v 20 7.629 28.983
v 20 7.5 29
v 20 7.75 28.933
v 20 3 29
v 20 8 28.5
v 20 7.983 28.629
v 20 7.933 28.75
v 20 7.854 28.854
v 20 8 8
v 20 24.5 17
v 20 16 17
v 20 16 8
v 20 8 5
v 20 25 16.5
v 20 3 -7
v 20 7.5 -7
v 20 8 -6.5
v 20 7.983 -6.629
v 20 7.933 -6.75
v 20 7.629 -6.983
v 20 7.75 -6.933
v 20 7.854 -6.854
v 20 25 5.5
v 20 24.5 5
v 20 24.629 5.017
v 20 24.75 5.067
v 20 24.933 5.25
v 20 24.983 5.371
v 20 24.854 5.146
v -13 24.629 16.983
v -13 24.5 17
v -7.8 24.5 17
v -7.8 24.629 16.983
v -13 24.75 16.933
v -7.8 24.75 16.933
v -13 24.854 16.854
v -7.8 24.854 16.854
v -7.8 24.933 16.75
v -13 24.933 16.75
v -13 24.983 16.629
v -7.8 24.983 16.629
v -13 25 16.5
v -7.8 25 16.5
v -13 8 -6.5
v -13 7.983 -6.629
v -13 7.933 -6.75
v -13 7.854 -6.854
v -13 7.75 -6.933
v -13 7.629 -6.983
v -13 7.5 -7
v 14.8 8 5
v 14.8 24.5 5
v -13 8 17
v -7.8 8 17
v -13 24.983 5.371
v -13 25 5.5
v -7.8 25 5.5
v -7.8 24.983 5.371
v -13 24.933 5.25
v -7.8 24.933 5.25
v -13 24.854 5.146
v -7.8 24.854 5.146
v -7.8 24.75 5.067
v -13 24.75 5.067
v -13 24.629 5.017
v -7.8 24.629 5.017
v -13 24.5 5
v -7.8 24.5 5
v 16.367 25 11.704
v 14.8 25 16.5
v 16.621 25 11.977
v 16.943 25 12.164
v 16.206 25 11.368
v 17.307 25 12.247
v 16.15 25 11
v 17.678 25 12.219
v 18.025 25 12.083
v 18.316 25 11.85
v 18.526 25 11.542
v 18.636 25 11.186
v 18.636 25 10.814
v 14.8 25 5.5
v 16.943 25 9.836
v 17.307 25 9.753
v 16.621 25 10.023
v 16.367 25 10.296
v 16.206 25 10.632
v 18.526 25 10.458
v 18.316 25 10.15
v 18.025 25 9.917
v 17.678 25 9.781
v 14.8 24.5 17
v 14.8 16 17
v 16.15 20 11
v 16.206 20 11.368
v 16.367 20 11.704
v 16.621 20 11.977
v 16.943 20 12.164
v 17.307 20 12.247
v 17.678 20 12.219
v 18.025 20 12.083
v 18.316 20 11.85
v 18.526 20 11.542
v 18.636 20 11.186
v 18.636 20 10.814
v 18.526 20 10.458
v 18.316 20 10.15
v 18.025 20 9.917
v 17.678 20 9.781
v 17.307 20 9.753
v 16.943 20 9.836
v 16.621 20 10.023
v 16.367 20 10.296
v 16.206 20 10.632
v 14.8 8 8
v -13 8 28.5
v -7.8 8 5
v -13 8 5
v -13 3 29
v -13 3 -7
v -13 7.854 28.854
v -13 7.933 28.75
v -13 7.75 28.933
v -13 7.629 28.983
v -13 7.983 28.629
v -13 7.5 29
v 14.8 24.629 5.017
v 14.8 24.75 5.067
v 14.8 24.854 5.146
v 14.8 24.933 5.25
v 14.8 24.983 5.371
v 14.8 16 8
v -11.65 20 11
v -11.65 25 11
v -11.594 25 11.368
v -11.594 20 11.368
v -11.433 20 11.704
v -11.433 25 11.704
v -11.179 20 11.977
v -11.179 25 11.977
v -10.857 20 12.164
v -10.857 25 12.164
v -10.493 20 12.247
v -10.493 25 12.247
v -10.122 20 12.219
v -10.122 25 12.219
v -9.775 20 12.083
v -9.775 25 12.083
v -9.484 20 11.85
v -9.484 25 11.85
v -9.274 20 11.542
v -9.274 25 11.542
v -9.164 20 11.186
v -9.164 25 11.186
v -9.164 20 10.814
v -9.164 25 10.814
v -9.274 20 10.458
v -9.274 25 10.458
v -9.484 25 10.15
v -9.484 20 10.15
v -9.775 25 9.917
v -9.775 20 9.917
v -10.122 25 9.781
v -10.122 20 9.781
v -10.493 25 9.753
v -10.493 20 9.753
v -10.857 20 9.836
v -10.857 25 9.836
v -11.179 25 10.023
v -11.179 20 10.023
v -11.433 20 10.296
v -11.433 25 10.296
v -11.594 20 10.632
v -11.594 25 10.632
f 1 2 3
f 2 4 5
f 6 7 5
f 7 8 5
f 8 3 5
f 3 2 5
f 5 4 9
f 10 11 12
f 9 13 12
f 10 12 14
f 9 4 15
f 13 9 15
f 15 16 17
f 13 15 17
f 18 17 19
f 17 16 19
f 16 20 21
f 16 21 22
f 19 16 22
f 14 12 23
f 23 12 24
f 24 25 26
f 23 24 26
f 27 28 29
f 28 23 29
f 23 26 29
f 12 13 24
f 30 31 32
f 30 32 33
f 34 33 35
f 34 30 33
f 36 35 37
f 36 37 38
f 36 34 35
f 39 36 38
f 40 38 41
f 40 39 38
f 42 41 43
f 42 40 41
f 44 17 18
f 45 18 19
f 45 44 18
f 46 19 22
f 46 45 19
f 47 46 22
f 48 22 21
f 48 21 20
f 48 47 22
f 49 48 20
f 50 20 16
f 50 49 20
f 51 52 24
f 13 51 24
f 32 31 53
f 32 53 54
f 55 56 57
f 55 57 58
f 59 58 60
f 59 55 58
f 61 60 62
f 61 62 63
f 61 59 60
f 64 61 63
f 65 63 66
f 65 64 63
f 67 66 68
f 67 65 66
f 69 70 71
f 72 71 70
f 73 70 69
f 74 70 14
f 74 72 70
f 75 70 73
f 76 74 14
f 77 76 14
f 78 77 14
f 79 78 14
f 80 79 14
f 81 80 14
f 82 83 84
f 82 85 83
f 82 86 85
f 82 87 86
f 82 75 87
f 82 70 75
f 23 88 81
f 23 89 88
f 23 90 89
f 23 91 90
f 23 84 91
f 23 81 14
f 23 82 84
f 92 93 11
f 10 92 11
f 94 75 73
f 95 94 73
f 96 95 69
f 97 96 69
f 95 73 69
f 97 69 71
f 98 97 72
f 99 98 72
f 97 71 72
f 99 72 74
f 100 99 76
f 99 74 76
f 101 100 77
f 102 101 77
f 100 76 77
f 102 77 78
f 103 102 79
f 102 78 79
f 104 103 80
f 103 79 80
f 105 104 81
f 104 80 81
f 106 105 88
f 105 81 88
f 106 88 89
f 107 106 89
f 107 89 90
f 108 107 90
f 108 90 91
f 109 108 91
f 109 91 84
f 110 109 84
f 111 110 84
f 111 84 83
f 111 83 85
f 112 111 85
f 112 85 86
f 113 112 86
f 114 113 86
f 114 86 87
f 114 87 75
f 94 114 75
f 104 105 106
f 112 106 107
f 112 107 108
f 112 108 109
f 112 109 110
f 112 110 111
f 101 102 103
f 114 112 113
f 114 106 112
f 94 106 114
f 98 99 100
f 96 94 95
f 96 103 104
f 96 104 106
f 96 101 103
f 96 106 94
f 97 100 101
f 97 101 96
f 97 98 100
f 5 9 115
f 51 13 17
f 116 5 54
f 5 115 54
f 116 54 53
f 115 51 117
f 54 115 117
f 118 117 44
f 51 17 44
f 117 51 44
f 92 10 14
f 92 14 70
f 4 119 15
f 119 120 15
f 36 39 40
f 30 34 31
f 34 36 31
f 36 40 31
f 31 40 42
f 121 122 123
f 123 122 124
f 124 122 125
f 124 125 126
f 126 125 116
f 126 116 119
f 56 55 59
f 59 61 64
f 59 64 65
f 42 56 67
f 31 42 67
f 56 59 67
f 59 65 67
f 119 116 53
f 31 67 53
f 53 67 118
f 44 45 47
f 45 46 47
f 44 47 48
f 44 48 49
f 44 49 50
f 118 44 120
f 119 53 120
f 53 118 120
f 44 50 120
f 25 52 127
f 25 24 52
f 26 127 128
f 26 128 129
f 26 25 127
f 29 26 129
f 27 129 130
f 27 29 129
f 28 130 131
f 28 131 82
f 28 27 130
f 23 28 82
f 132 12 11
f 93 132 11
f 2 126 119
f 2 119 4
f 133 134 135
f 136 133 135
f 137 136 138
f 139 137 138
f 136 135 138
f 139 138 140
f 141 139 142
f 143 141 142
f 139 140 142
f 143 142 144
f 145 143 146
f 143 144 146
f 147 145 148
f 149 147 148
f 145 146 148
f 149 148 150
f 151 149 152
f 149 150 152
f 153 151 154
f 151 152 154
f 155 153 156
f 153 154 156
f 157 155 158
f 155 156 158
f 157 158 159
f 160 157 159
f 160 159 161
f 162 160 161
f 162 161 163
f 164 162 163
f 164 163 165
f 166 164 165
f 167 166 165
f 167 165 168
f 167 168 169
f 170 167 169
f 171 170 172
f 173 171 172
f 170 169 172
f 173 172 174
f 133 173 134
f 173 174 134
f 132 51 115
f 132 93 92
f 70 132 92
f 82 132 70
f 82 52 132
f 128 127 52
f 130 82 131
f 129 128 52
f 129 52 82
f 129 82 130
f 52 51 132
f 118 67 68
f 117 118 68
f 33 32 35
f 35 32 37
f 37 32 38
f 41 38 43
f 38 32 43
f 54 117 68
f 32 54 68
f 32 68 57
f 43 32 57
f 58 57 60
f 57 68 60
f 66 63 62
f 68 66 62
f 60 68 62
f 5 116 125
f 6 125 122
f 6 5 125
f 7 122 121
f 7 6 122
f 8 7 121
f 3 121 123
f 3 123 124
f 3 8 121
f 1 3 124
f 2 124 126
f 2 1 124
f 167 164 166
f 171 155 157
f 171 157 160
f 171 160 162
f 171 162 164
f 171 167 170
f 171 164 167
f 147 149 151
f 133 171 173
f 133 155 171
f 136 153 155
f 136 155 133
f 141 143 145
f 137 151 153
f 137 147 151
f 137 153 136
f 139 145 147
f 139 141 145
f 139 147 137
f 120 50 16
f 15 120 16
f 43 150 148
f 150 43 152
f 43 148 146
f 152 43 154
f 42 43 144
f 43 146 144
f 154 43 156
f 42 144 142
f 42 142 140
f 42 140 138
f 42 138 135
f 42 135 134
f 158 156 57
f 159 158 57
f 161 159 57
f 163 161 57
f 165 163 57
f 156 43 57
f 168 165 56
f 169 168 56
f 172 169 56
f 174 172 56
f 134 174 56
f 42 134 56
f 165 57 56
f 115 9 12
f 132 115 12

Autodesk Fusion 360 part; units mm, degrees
sketch "Sketch1" plane through (0, 0, 0) normal (0, 0, 1) x (1, 0, 0)
  line L0 (-13, 8) -> (20, 8)
  line L1 (20, 8) -> (20, 3)
  line L2 (20, 3) -> (-13, 3)
  line L3 (-13, 3) -> (-13, 8)
  line L4 (-13, 8) -> (-7.8, 8)
  line L5 (-7.8, 8) -> (-7.8, 25)
  line L6 (-7.8, 25) -> (-13, 25)
  line L7 (-13, 25) -> (-13, 8)
  line L8 (20, 8) -> (14.8, 8)
  line L9 (14.8, 8) -> (14.8, 25)
  line L10 (14.8, 25) -> (20, 25)
  line L11 (20, 25) -> (20, 8)
  dimension "d1" = 33
  dimension "d2" = 5
  dimension "d3" = 5.2
  dimension "d4" = 17
  dimension "d5" = 17
  dimension "d6" = 5.2
extrude "Extrude1" add sketch "Sketch1" along normal blind 22
sketch "Sketch2" plane through (0, 0, 22) normal (0, 0, 1) x (1, 0, 0)
  line L0 (-7.8, 8) -> (-7.8, 25)
  line L1 (-7.8, 25) -> (-13, 25)
  line L2 (-13, 25) -> (-13, 3)
  line L3 (-13, 3) -> (20, 3)
  line L4 (20, 3) -> (20, 25)
  line L5 (20, 25) -> (14.8, 25)
  line L6 (14.8, 25) -> (14.8, 8)
  line L7 (14.8, 8) -> (-7.8, 8)
  line L8 (-13, 25) -> (-7.8, 25)
  line L9 (-7.8, 25) -> (-7.8, 8)
  line L10 (-7.8, 8) -> (-13, 8)
  line L11 (-13, 8) -> (-13, 25)
  line L12 (14.8, 25) -> (20, 25)
  line L13 (20, 25) -> (20, 8)
  line L14 (20, 8) -> (14.8, 8)
  line L15 (14.8, 8) -> (14.8, 25)
  line L16 (20, 25) -> (14.8, 25)
  line L17 (14.8, 25) -> (14.8, 8)
  line L18 (14.8, 8) -> (20, 8)
  line L19 (20, 8) -> (20, 25)
  line L20 (-7.8, 25) -> (-13, 25)
  line L21 (-13, 25) -> (-13, 8)
  line L22 (-13, 8) -> (-7.8, 8)
  line L23 (-7.8, 8) -> (-7.8, 25)
  point P0 (20, 8)
  dimension "d9" = 17
  dimension "d10" = 5.2
  dimension "d15" = 5.2
  dimension "d16" = 17
extrude "Extrude5" cut sketch "Sketch1" along normal blind 5 contours L0 L4 L5 L6 L7
extrude "Extrude4" cut sketch "Sketch1" along normal blind 5 contours L0 L8 L9 L10 L11
extrude "Extrude3" cut sketch "Sketch2" against normal blind 5 contours L4 L5 L6 L12 L13 L14 L15 L16 L17 L18 L19
extrude "Extrude2" cut sketch "Sketch2" against normal blind 5 contours L0 L1 L2 L8 L9 L10 L11 L20 L21 L22 L23
extrude "Extrude6" add sketch "Sketch1" against normal blind 7 contours L0 L1 L2 L3 L4 L8
extrude "Extrude7" add sketch "Sketch2" along normal blind 7 contours L2 L3 L4 L7 L10 L14 L18 L22
sketch "Sketch3" plane through (20, 0, 0) normal (1, 0, 0) x (0, 0, -1)
  line L0 (-17, 25) -> (-17, 8)
  line L1 (-17, 8) -> (-29, 8)
  line L2 (-29, 8) -> (-29, 3)
  line L3 (-29, 3) -> (7, 3)
  line L4 (7, 3) -> (7, 8)
  line L5 (7, 8) -> (-5, 8)
  line L6 (-5, 8) -> (-5, 25)
  line L7 (-5, 25) -> (-17, 25)
  line L8 (-17, 8) -> (-8, 8)
  line L9 (-8, 8) -> (-8, 16)
  line L10 (-8, 16) -> (-17, 16)
  line L11 (-17, 16) -> (-17, 8)
extrude "Extrude8" cut sketch "Sketch3" against normal blind 9 contours L0 L8 L9 L10 L11
chamfer "Chamfer1" distance 0.5 angle 45 1 edges at (17.4, 25, 17)
fillet "Fillet1" radius 0.5 1 edges at (-10.4, 25, 17)
fillet "Fillet2" radius 0.5 1 edges at (-10.4, 25, 5)
fillet "Fillet3" radius 0.5 1 edges at (17.4, 25, 5)
fillet "Fillet4" radius 0.5 2 edges at (3.5, 8, 29) (3.5, 8, -7)
sketch "Sketch4" plane through (0, 25, 0) normal (0, 1, 0) x (-1, 0, 0)
  line L0 (7.8, 5.5) -> (13, 5.5)
  line L1 (13, 5.5) -> (13, 16.5)
  line L2 (13, 16.5) -> (7.8, 16.5)
  line L3 (7.8, 16.5) -> (7.8, 5.5)
  circle A0 centre (10.4, 11) radius 1.25
  circle A1 centre (-17.4, 11) radius 1.25
  dimension "d32" = 2.5
  dimension "d33" = 2.5
extrude "Extrude9" cut sketch "Sketch4" against normal blind 5 contours A0
extrude "Extrude10" cut sketch "Sketch4" against normal blind 5 contours A1
